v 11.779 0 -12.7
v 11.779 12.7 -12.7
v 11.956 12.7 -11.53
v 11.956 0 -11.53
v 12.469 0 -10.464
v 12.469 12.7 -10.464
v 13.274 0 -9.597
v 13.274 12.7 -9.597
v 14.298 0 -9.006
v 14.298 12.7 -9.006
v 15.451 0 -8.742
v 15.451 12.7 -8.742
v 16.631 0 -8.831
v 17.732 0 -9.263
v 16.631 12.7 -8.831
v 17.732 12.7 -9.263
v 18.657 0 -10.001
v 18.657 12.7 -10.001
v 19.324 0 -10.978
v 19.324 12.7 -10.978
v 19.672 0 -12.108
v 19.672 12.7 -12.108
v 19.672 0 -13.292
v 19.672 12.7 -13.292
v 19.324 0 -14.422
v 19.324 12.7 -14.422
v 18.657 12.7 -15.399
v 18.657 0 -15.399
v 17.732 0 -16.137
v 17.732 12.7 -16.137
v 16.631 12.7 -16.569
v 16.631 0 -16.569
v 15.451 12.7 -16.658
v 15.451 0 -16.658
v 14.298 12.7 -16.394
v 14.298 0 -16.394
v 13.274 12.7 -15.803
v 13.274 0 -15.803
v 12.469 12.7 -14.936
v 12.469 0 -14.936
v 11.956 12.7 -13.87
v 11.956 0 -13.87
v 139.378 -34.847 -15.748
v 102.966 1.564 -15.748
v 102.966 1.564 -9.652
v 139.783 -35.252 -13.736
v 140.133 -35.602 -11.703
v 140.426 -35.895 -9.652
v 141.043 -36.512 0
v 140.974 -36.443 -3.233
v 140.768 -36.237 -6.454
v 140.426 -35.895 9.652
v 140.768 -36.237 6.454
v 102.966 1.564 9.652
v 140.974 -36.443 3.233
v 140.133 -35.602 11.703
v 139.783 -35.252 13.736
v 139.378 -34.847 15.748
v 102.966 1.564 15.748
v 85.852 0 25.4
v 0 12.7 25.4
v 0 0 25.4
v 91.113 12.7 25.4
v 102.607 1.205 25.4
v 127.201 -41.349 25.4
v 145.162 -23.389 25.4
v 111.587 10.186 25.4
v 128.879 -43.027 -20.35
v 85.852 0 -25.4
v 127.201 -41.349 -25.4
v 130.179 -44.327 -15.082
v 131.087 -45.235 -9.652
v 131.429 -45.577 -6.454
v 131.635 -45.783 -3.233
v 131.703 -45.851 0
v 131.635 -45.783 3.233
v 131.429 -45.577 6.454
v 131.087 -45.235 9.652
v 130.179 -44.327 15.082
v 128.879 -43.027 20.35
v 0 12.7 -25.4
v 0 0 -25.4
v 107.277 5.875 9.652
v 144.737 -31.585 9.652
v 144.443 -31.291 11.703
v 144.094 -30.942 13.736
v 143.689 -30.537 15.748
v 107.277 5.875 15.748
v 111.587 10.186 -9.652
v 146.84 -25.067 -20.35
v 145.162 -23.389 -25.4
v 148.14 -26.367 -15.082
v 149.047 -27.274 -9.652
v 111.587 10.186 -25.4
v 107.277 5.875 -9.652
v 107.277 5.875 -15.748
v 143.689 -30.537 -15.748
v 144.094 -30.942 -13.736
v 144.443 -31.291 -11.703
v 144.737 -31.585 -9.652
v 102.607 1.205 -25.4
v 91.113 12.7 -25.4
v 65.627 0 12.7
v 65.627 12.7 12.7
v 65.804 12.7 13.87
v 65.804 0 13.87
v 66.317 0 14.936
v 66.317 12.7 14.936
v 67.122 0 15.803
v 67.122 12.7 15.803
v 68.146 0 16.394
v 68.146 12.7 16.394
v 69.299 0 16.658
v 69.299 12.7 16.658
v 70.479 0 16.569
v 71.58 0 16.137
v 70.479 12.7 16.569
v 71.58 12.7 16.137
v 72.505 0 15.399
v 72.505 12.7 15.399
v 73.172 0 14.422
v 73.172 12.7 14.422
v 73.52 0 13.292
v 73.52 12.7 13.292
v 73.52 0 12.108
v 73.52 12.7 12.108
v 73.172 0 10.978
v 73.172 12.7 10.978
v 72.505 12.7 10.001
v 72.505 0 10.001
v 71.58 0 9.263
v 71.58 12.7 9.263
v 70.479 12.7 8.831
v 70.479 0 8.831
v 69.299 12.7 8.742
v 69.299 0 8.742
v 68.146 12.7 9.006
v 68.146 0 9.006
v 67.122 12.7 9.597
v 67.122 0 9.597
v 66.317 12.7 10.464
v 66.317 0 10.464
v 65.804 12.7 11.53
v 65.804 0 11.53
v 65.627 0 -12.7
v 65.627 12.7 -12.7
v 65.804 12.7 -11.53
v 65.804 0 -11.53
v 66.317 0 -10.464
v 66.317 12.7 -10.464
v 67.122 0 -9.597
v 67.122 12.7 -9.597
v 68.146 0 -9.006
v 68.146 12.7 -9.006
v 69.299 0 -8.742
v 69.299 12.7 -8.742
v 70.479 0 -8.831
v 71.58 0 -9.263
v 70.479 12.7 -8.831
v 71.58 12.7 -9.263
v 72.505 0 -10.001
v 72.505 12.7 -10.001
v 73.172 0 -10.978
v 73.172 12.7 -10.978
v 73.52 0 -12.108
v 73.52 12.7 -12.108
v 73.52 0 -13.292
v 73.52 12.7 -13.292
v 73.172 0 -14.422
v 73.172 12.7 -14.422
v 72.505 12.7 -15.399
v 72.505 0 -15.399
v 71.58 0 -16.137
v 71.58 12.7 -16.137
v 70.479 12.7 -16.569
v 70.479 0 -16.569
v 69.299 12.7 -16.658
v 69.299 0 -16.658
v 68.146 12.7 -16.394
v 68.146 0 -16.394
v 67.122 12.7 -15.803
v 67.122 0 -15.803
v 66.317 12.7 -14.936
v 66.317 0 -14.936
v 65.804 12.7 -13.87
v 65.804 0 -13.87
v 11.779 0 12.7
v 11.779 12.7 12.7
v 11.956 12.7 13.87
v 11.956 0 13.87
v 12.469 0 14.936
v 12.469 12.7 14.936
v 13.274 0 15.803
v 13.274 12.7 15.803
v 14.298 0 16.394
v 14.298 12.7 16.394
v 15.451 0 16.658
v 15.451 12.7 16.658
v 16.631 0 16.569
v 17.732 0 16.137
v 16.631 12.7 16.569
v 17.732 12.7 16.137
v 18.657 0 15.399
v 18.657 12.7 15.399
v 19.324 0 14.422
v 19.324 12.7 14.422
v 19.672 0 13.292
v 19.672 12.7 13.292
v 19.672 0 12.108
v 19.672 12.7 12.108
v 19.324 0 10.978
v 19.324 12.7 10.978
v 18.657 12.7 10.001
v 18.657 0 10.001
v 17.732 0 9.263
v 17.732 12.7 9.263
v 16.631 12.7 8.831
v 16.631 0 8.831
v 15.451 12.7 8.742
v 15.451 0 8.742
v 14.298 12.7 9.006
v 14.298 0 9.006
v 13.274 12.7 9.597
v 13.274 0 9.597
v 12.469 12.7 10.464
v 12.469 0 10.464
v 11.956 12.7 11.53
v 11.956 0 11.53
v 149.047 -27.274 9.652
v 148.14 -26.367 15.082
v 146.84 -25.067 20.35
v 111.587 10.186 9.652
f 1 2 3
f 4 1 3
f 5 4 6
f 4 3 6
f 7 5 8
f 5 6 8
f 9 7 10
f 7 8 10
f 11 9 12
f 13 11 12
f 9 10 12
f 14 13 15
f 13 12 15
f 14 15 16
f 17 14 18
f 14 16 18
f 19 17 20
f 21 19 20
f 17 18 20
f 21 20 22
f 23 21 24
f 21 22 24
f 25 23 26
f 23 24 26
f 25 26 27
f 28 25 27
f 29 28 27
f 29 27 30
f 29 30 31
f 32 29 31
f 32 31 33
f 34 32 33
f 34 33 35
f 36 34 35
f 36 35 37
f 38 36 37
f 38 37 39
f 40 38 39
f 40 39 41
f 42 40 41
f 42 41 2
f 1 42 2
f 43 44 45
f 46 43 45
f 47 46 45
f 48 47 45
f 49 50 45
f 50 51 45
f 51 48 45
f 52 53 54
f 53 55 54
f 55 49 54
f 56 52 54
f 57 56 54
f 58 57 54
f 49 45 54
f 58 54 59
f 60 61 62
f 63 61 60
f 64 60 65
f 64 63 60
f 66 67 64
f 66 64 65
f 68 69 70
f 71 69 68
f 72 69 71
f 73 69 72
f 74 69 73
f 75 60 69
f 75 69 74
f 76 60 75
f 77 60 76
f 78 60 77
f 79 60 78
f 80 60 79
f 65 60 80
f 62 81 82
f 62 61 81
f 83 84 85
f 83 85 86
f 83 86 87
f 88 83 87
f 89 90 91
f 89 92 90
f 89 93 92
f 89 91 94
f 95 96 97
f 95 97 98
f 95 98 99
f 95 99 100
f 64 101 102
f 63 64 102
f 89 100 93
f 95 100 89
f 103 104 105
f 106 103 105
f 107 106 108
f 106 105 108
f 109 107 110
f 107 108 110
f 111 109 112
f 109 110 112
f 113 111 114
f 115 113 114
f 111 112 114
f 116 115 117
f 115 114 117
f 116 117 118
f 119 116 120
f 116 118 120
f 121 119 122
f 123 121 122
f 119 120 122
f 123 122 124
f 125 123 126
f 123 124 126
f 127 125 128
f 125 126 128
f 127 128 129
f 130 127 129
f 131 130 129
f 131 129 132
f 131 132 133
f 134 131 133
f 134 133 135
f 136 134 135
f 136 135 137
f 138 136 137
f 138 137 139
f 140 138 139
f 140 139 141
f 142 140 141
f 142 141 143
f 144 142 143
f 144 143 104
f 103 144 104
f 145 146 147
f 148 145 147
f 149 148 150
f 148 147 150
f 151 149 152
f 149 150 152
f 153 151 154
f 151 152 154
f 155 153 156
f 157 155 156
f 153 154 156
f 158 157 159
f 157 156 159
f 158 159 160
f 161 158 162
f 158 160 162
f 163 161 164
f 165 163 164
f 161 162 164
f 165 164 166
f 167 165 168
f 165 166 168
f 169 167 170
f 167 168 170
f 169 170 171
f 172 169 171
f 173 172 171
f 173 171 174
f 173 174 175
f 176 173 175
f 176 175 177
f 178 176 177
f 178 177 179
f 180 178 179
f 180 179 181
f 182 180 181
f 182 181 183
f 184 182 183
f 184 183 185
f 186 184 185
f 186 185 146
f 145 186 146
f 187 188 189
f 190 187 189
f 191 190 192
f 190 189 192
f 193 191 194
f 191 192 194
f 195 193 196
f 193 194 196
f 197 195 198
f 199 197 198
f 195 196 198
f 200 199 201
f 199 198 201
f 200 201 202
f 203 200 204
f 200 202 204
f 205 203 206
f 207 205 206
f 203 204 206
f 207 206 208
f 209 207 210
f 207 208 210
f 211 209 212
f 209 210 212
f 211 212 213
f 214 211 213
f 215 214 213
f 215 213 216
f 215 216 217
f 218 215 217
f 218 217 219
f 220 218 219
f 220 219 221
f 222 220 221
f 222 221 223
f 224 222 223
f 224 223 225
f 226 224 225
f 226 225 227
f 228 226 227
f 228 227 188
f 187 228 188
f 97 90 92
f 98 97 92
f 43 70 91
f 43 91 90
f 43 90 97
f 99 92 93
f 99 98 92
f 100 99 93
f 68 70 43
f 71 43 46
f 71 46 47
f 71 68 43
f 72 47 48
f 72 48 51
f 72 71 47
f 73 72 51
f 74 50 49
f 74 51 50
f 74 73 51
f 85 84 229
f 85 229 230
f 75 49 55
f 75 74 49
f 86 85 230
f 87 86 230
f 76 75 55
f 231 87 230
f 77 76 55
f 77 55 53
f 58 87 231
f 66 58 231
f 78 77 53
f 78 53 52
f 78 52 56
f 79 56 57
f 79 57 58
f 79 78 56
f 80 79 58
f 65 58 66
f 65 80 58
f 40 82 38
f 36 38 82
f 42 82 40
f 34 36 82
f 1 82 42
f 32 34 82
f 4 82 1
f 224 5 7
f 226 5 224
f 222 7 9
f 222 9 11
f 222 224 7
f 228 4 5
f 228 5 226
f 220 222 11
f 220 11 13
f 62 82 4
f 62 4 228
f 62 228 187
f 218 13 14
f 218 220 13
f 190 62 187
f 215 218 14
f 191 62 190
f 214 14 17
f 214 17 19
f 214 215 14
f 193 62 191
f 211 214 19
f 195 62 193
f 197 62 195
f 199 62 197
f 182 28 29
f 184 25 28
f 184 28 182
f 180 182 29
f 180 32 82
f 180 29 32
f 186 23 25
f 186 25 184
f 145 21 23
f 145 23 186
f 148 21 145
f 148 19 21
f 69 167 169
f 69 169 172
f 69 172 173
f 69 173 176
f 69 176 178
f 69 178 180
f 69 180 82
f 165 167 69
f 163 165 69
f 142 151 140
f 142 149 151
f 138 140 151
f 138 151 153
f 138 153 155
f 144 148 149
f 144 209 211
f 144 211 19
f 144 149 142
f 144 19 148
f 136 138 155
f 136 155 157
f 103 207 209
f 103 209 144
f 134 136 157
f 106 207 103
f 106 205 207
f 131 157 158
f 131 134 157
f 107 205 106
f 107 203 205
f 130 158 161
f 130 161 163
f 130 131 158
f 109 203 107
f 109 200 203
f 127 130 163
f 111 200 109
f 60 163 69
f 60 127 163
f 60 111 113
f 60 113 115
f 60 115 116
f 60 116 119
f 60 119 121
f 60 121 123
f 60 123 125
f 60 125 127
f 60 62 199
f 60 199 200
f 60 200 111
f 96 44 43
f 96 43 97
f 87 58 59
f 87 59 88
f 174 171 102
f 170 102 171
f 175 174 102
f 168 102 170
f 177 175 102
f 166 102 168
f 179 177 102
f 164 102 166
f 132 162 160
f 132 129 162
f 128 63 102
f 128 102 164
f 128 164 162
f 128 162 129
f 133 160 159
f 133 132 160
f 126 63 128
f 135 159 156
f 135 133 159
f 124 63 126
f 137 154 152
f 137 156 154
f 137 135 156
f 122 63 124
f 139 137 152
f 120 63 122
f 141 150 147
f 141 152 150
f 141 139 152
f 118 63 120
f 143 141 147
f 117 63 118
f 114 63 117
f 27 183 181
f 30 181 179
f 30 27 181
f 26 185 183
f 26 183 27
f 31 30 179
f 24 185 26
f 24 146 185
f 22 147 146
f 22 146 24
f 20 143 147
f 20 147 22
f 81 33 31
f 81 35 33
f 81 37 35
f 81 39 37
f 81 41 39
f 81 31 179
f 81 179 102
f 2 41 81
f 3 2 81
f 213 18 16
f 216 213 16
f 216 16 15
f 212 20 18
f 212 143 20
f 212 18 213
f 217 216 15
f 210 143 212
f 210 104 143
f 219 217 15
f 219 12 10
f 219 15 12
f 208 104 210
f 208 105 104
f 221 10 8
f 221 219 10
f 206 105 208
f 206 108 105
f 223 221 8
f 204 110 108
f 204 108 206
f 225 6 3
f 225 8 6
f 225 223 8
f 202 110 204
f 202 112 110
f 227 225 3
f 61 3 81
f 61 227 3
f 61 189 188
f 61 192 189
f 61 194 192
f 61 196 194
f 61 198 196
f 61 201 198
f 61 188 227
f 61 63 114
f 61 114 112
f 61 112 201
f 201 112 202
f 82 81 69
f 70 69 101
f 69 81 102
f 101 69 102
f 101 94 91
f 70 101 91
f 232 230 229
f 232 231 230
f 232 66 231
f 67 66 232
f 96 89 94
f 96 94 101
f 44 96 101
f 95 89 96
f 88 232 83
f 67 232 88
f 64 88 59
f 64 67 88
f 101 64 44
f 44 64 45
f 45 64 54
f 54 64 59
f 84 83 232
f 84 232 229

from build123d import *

# Parameters (mm, degrees)
BOSS_EXTRUDE1_DEPTH = 25.4
CUT_EXTRUDE2_DEPTH  = 12.192
CUT_EXTRUDE3_DEPTH  = 141.749443769
SKETCH3_W           = 31.496
SKETCH3_H           = 6.096
CUT_EXTRUDE4_DEPTH  = 120.736402781
SKETCH4_R           = 3.96875
CUT_EXTRUDE5_DEPTH  = 163.137144219


with BuildPart() as part:
    # Sketch1 → Boss-Extrude1 (new, symmetric)
    with BuildSketch(Plane.XY):
        Polygon((0, 0), (85.852, 0), (131.703269909, -45.851269909), (149.663782152, -27.890757667), (111.587496198, 10.185528286), (102.607240077, 1.205272165), (91.112512242, 12.7), (0, 12.7), align=None)
    extrude(amount=BOSS_EXTRUDE1_DEPTH, both=True)

    # Sketch2 → Cut-Extrude2 (cut)
    with BuildSketch(Plane(origin=(60.886512242, 60.886512242, 0), x_dir=(0, 0, -1), z_dir=(0.707106781186544, 0.7071067811865511, 0))):
        with BuildLine():
            Line((-25.4, -119.183037491), (-25.4, -125.550019136))
            Line((-25.4, -125.550019136), (25.4, -125.550019136))
            Line((25.4, -125.550019136), (25.4, -119.183037491))
            ThreePointArc((25.4, -119.183037491), (17.740042491, -122.543911277), (9.652, -124.677919317))
            Line((9.652, -124.677919317), (9.652, -71.702019136))
            Line((9.652, -71.702019136), (-9.652, -71.702019136))
            Line((-9.652, -71.702019136), (-9.652, -124.677919317))
            ThreePointArc((-9.652, -124.677919317), (-17.740042491, -122.543911277), (-25.4, -119.183037491))
        make_face()
    extrude(amount=-CUT_EXTRUDE2_DEPTH, mode=Mode.SUBTRACT)

    # Sketch2<5> → Cut-Extrude3 (cut, through all)
    with BuildSketch(Plane(origin=(60.886512242, 60.886512242, 0), x_dir=(0, 0, -1), z_dir=(0.707106781186544, 0.7071067811865511, 0))):
        with BuildLine():
            Line((-25.4, -119.183037491), (-25.4, -125.550019136))
            Line((-25.4, -125.550019136), (0, -125.550019136))
            ThreePointArc((0, -125.550019136), (-13.09292228, -123.934025513), (-25.4, -119.183037491))
        make_face()
        with BuildLine():
            Line((0, -125.550019136), (25.4, -125.550019136))
            Line((25.4, -125.550019136), (25.4, -119.183037491))
            ThreePointArc((25.4, -119.183037491), (13.09292228, -123.934025513), (0, -125.550019136))
        make_face()
    extrude(amount=-CUT_EXTRUDE3_DEPTH, mode=Mode.SUBTRACT)

    # Sketch3 → Cut-Extrude4 (cut, through all)
    with BuildSketch(Plane(origin=(50.700983956, -50.700983956, 0), x_dir=(0, 0, 1), z_dir=(-0.7071067811865549, 0.7071067811865401, 0))):
        with Locations((0, 76.962531378)):
            Rectangle(SKETCH3_W, SKETCH3_H)
    extrude(amount=-CUT_EXTRUDE4_DEPTH, mode=Mode.SUBTRACT)

    # Sketch4 → Cut-Extrude5 (cut, through all)
    with BuildSketch(Plane(origin=(0, 12.7, 0), x_dir=(1, 0, 0), z_dir=(0, 1, 0))):
        with Locations((15.748, 12.7)):
            Circle(SKETCH4_R)
        with Locations((69.596, 12.7)):
            Circle(SKETCH4_R)
        with Locations((15.748, -12.7)):
            Circle(SKETCH4_R)
        with Locations((69.596, -12.7)):
            Circle(SKETCH4_R)
    extrude(amount=-CUT_EXTRUDE5_DEPTH, mode=Mode.SUBTRACT)


solid = part.part
